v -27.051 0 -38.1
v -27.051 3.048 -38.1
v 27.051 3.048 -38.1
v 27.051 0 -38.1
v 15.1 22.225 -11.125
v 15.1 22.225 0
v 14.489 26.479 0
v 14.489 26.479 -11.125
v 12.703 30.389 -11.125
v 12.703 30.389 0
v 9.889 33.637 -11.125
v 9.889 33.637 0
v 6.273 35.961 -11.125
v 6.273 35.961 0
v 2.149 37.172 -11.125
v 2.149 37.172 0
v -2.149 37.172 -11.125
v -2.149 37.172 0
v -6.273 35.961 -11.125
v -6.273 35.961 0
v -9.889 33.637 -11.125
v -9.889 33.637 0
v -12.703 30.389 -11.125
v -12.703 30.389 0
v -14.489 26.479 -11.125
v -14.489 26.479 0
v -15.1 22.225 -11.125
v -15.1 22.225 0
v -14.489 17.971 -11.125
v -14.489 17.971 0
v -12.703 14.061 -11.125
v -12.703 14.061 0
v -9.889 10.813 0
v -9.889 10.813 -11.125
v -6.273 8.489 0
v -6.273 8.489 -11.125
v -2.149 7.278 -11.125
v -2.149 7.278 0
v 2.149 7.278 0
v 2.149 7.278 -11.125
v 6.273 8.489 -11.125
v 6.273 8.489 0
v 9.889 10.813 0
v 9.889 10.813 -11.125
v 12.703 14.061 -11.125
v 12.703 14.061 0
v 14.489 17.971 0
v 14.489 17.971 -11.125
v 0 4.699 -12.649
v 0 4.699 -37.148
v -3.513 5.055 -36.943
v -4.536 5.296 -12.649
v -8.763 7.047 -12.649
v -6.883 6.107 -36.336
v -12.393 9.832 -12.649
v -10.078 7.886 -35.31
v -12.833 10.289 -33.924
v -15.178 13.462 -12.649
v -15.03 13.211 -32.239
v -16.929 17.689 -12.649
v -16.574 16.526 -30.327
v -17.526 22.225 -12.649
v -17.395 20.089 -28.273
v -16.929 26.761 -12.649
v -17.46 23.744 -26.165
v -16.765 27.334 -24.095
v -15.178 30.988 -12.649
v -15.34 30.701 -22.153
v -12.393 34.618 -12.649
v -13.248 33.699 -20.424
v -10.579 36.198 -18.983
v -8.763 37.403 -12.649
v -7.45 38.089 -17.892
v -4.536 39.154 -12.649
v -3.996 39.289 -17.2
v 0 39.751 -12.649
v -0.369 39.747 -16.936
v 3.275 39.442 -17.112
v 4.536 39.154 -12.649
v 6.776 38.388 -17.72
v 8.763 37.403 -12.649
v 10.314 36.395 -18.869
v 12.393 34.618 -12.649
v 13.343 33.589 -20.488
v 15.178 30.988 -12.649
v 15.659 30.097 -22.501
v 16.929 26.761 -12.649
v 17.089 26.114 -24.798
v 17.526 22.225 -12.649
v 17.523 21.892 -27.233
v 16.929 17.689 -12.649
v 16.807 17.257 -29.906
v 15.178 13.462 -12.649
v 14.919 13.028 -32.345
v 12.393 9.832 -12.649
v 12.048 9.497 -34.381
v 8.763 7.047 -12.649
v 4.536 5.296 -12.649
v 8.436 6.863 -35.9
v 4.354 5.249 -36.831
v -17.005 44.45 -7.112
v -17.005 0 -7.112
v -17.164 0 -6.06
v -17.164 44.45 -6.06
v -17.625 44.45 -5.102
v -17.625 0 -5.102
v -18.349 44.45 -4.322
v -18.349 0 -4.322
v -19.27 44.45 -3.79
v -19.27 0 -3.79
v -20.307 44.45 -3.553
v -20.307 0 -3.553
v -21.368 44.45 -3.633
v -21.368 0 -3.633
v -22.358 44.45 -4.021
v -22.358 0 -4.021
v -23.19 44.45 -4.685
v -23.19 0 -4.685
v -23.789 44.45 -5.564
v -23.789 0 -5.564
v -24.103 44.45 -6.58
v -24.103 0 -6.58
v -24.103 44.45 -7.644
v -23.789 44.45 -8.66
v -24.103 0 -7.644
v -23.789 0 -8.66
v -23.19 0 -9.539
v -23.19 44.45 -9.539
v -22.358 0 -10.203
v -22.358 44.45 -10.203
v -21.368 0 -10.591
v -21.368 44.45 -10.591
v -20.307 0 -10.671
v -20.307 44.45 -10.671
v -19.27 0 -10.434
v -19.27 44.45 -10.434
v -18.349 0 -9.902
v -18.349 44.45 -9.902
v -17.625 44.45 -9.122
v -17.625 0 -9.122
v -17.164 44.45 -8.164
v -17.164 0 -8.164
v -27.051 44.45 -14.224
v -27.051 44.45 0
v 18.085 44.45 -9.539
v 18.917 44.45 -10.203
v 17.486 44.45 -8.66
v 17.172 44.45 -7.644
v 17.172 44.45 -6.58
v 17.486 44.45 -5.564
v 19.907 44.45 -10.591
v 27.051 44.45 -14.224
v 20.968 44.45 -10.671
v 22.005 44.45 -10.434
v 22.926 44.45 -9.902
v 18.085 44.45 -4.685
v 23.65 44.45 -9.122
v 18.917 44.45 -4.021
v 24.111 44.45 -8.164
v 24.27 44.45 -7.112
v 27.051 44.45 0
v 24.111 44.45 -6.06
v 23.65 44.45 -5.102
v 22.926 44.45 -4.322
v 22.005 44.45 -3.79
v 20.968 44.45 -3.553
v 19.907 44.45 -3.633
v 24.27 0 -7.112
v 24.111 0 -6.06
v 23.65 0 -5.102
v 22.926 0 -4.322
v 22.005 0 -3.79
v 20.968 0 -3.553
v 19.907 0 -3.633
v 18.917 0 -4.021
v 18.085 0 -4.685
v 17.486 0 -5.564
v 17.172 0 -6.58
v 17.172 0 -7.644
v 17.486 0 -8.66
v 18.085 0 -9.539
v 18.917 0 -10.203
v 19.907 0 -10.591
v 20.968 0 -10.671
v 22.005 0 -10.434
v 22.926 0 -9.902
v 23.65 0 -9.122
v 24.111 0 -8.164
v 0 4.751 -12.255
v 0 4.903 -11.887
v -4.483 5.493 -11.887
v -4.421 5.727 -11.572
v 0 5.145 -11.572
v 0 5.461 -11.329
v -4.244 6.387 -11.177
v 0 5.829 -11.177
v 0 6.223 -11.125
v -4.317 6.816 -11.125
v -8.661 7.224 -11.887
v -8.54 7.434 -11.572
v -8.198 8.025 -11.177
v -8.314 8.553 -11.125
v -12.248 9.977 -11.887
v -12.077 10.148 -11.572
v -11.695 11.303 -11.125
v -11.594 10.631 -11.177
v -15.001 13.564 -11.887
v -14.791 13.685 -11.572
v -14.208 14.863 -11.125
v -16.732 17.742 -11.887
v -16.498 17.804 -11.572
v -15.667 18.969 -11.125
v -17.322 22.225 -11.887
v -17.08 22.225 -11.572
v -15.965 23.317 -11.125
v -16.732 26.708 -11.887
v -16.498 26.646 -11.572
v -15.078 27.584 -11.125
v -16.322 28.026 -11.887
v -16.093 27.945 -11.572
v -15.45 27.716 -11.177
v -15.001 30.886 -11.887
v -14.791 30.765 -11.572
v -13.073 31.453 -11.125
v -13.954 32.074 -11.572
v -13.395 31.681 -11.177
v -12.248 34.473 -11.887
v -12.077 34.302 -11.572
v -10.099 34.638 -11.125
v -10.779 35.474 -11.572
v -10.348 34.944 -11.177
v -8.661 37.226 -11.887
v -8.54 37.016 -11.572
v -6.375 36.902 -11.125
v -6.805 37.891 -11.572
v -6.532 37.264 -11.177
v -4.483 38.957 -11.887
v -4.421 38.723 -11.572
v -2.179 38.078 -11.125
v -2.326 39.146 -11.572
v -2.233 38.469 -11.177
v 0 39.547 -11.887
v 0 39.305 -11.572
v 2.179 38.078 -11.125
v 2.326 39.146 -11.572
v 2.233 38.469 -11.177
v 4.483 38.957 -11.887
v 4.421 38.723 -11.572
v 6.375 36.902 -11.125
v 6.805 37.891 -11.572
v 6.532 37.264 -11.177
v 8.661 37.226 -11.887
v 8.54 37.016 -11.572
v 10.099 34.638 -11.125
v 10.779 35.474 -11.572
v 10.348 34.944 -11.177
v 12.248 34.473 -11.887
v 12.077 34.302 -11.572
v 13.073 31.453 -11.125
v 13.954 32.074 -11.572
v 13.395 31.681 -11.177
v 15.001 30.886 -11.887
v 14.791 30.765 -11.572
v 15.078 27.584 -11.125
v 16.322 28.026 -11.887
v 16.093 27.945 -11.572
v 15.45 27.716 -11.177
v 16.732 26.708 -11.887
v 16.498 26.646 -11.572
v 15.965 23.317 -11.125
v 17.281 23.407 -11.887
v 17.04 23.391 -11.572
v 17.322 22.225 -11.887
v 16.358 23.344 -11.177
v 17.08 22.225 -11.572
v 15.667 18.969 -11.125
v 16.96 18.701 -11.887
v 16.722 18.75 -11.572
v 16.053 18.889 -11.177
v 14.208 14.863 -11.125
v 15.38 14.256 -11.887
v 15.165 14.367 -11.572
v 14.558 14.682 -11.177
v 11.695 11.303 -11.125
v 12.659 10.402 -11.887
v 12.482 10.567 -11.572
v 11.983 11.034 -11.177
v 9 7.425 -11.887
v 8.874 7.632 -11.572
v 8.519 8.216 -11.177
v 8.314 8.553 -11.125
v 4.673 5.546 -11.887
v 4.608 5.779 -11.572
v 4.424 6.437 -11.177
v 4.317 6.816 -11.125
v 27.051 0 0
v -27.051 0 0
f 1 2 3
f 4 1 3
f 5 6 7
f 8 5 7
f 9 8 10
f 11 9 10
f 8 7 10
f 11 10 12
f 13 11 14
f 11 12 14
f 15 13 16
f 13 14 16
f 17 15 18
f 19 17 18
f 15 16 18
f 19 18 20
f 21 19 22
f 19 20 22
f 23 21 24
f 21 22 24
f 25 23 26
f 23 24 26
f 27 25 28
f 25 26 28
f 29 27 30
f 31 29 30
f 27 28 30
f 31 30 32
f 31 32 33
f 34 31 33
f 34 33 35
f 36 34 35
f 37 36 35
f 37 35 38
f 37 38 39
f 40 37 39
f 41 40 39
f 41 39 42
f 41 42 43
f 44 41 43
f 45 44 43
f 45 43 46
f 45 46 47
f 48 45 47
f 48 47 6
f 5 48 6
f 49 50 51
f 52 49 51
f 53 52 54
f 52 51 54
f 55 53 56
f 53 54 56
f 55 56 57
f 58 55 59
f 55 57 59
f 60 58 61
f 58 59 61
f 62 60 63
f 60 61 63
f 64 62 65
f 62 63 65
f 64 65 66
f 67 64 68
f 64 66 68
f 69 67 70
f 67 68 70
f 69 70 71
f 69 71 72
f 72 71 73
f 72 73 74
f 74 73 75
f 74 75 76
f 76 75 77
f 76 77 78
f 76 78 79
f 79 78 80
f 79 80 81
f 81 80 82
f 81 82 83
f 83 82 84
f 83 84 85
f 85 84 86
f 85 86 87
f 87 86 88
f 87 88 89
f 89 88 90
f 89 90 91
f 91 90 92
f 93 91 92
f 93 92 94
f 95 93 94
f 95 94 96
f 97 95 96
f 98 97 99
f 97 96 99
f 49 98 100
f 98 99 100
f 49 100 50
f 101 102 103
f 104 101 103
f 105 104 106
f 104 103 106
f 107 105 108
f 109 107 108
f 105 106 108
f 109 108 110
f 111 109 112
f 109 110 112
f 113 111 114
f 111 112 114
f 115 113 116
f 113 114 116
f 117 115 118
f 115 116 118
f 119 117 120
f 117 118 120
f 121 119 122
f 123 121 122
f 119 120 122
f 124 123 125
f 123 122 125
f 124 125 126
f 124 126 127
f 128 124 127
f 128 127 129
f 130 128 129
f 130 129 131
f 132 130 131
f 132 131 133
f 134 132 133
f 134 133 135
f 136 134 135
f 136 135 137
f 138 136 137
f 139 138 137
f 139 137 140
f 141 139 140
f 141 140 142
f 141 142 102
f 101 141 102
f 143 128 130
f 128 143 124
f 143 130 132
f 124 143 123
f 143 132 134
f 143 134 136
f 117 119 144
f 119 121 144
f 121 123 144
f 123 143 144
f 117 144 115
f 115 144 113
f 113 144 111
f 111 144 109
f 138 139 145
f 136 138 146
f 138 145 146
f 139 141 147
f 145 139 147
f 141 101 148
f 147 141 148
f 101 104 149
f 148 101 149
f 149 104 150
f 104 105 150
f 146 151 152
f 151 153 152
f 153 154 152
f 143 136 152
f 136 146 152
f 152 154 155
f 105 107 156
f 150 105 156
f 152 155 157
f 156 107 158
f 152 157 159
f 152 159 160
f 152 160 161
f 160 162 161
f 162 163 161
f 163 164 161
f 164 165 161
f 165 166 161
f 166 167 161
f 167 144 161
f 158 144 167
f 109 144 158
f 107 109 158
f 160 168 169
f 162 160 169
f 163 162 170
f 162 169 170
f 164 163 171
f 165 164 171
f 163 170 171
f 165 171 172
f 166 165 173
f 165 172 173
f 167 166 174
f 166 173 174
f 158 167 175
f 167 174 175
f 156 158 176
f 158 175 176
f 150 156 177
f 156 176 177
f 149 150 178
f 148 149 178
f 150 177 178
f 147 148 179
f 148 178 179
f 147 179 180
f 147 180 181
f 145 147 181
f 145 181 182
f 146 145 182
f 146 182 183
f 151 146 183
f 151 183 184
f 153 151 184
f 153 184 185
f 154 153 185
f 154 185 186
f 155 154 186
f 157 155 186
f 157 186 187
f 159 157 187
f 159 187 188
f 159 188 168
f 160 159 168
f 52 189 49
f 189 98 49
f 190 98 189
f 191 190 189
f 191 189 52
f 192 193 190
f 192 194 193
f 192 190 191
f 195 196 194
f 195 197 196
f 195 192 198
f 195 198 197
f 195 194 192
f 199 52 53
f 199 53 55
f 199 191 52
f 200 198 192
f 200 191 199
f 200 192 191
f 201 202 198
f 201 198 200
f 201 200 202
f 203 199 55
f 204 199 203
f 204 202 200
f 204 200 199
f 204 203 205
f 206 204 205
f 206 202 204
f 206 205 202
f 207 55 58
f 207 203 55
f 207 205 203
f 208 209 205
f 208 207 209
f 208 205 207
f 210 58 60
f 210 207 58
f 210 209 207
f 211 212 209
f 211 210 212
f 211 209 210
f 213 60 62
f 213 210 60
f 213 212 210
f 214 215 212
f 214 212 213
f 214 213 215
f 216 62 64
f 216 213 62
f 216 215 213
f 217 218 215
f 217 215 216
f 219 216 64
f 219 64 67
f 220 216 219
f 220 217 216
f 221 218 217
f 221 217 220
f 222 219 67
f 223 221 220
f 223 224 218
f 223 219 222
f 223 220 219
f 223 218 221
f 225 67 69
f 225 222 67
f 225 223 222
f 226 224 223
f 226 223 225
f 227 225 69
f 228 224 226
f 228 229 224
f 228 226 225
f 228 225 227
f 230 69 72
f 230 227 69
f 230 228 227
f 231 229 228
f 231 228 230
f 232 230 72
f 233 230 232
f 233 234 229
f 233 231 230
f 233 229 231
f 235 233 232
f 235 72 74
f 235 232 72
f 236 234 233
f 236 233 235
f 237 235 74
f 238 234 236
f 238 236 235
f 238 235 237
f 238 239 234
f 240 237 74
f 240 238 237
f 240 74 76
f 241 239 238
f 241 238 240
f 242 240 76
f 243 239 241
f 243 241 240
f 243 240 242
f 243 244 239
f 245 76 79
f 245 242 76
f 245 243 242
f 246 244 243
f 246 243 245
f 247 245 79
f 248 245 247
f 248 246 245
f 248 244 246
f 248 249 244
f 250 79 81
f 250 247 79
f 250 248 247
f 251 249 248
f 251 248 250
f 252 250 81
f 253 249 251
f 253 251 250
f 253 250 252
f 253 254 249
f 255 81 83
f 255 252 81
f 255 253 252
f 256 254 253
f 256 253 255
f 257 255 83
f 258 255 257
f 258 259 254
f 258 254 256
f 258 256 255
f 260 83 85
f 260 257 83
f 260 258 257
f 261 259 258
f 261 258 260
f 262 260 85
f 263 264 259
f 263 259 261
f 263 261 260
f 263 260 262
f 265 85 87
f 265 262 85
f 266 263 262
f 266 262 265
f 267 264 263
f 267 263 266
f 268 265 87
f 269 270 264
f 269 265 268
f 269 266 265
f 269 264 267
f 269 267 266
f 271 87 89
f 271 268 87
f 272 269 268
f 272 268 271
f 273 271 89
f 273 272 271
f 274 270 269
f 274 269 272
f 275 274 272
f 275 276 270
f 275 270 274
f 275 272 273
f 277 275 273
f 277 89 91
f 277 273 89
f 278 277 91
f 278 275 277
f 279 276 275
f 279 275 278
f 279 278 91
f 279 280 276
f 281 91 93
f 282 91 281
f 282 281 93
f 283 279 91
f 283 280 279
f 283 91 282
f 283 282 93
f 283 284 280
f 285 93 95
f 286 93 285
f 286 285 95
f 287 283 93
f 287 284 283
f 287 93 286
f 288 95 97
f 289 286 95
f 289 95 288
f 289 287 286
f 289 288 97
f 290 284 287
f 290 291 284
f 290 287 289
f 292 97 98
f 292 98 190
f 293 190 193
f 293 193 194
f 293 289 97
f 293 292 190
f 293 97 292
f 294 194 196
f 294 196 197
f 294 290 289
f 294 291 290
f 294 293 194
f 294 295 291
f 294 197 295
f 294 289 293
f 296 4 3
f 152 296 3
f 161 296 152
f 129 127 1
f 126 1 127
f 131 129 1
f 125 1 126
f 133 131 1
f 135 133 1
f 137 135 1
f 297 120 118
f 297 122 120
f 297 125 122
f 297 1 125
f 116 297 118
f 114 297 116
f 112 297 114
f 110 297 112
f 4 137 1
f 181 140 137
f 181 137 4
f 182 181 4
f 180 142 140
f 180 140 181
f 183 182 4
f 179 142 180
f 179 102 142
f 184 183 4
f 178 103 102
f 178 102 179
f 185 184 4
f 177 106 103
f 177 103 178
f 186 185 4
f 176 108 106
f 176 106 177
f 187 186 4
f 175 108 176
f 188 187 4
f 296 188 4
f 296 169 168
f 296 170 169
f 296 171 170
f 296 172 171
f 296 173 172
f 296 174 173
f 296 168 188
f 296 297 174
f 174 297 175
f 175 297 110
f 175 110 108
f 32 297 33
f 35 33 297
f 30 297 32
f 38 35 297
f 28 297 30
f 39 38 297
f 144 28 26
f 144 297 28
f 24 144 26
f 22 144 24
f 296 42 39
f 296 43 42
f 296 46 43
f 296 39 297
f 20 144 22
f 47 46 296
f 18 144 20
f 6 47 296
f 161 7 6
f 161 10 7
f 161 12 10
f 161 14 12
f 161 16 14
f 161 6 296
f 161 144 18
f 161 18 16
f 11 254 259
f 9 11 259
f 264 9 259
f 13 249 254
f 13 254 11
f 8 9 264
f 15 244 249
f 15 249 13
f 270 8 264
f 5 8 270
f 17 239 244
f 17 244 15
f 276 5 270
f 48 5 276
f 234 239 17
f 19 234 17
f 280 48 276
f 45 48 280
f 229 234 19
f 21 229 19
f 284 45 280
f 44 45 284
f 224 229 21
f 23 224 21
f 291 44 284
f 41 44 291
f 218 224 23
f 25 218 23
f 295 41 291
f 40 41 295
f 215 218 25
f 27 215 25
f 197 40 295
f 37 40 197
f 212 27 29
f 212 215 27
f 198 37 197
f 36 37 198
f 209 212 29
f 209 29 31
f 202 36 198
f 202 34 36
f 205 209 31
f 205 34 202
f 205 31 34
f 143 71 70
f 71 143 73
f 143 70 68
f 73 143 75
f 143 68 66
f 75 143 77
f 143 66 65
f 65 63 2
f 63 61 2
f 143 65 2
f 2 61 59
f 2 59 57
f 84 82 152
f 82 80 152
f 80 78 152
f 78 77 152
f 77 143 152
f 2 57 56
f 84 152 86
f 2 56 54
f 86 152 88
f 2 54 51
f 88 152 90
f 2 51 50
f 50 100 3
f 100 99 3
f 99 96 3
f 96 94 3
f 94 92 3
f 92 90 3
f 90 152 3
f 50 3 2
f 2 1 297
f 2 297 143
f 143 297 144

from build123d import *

# Parameters (mm, degrees)
SKETCH1_W          = 54.102
SKETCH1_H          = 44.45
SKETCH1_R          = 15.1003
EXTRUDE1_DEPTH     = 38.1
CUT_EXTRUDE1_DEPTH = 55.102
SKETCH3_R          = 17.526
CUT_EXTRUDE2_DEPTH = 26.9748
FILLET1_R          = 1.524
HOLE1_D            = 7.1374
HOLE1_DEPTH        = 44.45


with BuildPart() as part:
    # Sketch1 → Extrude1 (new body)
    with BuildSketch(Plane.XY):
        with Locations((0, 22.225)):
            Rectangle(SKETCH1_W, SKETCH1_H)
        with Locations((0, 22.225)):
            Circle(SKETCH1_R, mode=Mode.SUBTRACT)
    extrude(amount=-EXTRUDE1_DEPTH)

    # Sketch2 → Cut-Extrude1 (cut, through all)
    with BuildSketch(Plane(origin=(27.051, 0, 0), x_dir=(0, 0, -1), z_dir=(1, 0, 0))):
        Polygon((14.224, 44.45), (38.1, 3.048), (38.1, 44.45), align=None)
    extrude(amount=-CUT_EXTRUDE1_DEPTH, mode=Mode.SUBTRACT)

    # Sketch3 → Cut-Extrude2 (cut)
    with BuildSketch(Plane(origin=(0, 0, -38.1), x_dir=(-1, 0, 0), z_dir=(0, 0, -1))):
        with Locations(Location((0, 22.225, 0), (0, 0, 270))):  # turned: the seam where the file's is
            Circle(SKETCH3_R)
    extrude(amount=-CUT_EXTRUDE2_DEPTH, mode=Mode.SUBTRACT)

    # Fillet1
    fillet1_edges = [part.edges().sort_by_distance(p)[0] for p in [
        (0, 39.751, -11.1252),
    ]]
    fillet(fillet1_edges, radius=FILLET1_R)

    # Hole1
    with Locations(Plane(origin=(0, 44.45, 0), x_dir=(-1, 0, 0), z_dir=(0, 1, 0))):
        with Locations((20.574, -7.112), (-20.701, -7.112)):
            Hole(HOLE1_D / 2, depth=HOLE1_DEPTH)


solid = part.part
